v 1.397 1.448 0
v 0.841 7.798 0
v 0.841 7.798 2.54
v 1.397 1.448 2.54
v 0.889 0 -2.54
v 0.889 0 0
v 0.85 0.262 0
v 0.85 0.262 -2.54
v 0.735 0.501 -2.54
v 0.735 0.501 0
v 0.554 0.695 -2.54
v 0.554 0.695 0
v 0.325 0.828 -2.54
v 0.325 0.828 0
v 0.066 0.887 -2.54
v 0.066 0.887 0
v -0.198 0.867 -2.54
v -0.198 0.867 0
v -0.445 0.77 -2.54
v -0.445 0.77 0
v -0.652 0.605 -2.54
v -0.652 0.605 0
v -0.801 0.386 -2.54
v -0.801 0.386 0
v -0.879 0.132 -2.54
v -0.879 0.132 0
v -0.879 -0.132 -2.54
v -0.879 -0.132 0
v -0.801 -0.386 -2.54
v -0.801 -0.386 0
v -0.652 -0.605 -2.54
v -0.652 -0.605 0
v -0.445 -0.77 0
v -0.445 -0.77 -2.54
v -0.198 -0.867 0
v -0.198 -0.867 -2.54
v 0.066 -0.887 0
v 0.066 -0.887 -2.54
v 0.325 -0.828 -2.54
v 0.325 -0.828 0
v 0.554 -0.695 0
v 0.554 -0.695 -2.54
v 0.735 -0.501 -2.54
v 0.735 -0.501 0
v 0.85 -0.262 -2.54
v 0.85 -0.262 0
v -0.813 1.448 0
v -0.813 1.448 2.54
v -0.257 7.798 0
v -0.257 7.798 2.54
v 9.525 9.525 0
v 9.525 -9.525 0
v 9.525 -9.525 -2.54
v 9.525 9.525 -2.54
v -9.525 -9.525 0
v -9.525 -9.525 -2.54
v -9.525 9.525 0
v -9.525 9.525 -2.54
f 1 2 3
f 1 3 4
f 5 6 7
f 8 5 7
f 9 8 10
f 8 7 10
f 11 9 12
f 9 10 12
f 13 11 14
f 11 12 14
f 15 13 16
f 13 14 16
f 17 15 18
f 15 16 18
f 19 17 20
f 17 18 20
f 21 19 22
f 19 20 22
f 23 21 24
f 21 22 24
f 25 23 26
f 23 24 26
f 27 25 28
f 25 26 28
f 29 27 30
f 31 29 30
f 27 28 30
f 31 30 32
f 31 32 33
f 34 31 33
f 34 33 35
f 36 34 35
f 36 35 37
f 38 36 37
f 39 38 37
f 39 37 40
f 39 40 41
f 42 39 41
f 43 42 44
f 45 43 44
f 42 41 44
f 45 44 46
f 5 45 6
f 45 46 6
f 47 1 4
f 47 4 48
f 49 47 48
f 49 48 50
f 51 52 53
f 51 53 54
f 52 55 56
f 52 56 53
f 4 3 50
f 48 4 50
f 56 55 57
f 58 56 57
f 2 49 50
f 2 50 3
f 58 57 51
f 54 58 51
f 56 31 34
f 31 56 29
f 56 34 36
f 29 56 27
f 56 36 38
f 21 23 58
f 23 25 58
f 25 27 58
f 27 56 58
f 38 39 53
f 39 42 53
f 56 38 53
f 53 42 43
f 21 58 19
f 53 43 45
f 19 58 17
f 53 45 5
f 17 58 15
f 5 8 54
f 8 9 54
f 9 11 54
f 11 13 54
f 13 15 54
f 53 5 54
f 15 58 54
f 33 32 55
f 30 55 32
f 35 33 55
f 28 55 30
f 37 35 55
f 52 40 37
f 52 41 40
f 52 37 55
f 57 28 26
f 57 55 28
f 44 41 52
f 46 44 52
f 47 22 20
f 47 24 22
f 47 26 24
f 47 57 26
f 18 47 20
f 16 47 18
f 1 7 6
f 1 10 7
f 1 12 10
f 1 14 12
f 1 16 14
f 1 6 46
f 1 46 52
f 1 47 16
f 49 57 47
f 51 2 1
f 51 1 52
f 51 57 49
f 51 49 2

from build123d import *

# Parameters (mm, degrees)
SKETCH1_W      = 19.05
SKETCH1_H      = 19.05
SKETCH1_R      = 0.889
EXTRUDE1_DEPTH = 2.54
EXTRUDE2_DEPTH = 2.54


with BuildPart() as part:
    # Sketch1 → Extrude1 (new body)
    with BuildSketch(Plane.XY):
        Rectangle(SKETCH1_W, SKETCH1_H)
        Circle(SKETCH1_R, mode=Mode.SUBTRACT)
    extrude(amount=-EXTRUDE1_DEPTH)

    # Sketch2 → Extrude2 (add)
    with BuildSketch(Plane.XY):
        Polygon((0.841446987, 7.7978), (1.397, 1.4478), (-0.8128, 1.4478), (-0.257246987, 7.7978), align=None)
    extrude(amount=EXTRUDE2_DEPTH)


solid = part.part
